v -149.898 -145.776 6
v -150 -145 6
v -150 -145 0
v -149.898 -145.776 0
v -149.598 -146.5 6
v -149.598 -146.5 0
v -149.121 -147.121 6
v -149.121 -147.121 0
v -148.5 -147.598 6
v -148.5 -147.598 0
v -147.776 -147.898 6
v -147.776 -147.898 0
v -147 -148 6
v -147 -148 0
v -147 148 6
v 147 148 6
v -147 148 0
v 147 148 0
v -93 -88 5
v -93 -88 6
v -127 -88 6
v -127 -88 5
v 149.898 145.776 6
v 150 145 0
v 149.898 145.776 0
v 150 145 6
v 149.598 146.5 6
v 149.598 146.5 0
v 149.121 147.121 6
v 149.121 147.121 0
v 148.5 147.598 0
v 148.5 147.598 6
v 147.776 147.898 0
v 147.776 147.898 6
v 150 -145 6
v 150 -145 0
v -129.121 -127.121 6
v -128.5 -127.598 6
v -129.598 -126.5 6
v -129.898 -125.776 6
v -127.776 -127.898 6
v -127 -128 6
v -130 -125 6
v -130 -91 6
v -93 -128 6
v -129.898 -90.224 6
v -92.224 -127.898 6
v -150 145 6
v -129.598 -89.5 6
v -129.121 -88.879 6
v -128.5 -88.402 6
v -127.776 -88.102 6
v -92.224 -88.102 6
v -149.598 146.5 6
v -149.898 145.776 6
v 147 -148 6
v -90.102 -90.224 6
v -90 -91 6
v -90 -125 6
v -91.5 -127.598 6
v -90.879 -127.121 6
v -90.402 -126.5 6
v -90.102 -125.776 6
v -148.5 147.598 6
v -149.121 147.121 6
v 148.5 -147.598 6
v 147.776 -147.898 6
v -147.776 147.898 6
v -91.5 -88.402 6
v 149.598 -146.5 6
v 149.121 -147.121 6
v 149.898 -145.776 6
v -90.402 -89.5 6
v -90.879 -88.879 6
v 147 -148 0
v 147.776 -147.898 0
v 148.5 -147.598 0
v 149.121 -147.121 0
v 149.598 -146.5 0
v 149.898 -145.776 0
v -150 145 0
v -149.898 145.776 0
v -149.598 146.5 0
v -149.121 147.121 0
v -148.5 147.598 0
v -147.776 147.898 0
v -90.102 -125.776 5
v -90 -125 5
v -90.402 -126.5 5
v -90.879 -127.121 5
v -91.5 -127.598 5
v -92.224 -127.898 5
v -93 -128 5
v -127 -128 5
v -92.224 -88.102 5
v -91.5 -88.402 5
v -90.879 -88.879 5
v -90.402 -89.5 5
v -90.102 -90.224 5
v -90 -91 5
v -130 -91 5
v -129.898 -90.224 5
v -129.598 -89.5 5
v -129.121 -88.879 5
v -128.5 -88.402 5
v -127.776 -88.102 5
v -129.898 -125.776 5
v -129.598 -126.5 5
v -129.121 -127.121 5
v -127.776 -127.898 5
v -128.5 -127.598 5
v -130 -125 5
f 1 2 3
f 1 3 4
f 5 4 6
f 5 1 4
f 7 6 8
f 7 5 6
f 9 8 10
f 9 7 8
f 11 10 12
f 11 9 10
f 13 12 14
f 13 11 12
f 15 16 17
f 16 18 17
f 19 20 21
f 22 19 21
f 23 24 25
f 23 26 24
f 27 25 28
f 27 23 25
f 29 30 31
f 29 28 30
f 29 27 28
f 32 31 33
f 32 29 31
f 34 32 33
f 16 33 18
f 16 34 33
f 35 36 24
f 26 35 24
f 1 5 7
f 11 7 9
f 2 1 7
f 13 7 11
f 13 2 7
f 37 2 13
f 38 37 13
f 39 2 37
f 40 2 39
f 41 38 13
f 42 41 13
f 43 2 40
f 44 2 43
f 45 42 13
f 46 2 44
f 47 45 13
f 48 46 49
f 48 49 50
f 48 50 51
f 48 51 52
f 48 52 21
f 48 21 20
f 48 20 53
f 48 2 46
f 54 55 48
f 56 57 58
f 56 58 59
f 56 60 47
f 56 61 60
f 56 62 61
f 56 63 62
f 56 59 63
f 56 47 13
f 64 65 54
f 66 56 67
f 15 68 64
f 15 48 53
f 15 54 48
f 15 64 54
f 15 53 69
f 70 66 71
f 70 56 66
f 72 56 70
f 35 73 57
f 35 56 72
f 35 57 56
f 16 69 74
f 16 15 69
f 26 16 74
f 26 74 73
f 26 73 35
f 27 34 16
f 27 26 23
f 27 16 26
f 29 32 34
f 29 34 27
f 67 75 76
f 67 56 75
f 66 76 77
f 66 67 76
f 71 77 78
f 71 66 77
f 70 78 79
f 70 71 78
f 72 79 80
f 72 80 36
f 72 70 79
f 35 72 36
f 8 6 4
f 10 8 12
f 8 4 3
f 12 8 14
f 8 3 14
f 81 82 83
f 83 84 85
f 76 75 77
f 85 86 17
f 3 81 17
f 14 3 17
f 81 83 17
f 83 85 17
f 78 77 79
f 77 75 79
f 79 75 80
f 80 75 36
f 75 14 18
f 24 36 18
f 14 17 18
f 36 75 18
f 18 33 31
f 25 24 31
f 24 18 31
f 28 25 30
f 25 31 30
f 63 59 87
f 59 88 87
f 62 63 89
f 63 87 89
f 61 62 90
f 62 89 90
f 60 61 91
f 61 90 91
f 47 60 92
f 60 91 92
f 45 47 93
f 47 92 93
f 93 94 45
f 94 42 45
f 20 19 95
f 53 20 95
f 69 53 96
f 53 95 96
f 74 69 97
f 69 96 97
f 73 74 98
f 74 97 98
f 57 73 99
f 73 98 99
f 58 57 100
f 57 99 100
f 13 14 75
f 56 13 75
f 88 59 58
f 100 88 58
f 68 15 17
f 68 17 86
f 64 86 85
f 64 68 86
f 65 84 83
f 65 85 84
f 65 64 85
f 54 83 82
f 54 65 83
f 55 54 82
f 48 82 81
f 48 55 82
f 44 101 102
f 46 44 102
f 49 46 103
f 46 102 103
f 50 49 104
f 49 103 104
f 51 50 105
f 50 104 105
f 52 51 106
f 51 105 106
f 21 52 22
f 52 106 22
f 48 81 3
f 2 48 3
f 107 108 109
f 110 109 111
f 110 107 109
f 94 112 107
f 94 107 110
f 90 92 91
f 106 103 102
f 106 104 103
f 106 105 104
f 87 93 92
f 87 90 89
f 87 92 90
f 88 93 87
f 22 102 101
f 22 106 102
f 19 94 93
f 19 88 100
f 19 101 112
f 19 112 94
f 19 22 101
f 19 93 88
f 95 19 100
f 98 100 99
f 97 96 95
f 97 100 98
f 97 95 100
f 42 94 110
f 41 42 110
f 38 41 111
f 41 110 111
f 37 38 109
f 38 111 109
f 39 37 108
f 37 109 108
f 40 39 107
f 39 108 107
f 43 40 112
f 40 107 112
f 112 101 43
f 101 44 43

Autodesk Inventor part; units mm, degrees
ref_plane "YZ Plane" through (0, 0, 0) normal (1, 0, 0) x (0, 1, 0)
ref_plane "XZ Plane" through (0, 0, 0) normal (0, 1, 0) x (-1, 0, 0)
ref_plane "XY Plane" through (0, 0, 0) normal (0, 0, 1) x (1, 0, 0)
sketch "Sketch1" plane through (0, 0, 0) normal (0, 0, 1) x (1, 0, 0)
  line L0 (-150, -148) -> (150, -148)
  line L1 (150, -148) -> (150, 148)
  line L2 (150, 148) -> (-150, 148)
  line L3 (-150, 148) -> (-150, -148)
  line L4 (-150, -148) -> (150, 148) construction
  line L5 (150, -148) -> (-150, 148) construction
  point P0 (0, 0)
  dimension "d0" = 296
  dimension "d1" = 300
extrude "Extrusion1" add sketch "Sketch1" along normal blind 6
sketch "Sketch2" plane through (0, 0, 6) normal (0, 0, 1) x (1, 0, 0)
  line L0 (-130, -128) -> (-90, -128)
  line L1 (-90, -128) -> (-90, -88)
  line L2 (-90, -88) -> (-130, -88)
  line L3 (-130, -88) -> (-130, -128)
  line L4 (-150, 148) -> (-150, -148) projected
  line L5 (-150, -148) -> (150, -148) projected
  point P0 (0, 0)
  dimension "d4" = 20
  dimension "d5" = 20
  dimension "d6" = 40
  dimension "d7" = 40
extrude "Extrusion2" cut sketch "Sketch2" against normal blind 1
fillet "Fillet1" radius 3 4 edges at (-130, -88, 5.5) (-90, -88, 5.5) (-90, -128, 5.5) (-130, -128, 5.5)
fillet "Fillet2" radius 3 4 edges at (-150, -148, 3) (150, -148, 3) (150, 148, 3) (-150, 148, 3)
equation "\"d5\" = d4"
properties part number "VacuumTableAdjustmentPlate"
